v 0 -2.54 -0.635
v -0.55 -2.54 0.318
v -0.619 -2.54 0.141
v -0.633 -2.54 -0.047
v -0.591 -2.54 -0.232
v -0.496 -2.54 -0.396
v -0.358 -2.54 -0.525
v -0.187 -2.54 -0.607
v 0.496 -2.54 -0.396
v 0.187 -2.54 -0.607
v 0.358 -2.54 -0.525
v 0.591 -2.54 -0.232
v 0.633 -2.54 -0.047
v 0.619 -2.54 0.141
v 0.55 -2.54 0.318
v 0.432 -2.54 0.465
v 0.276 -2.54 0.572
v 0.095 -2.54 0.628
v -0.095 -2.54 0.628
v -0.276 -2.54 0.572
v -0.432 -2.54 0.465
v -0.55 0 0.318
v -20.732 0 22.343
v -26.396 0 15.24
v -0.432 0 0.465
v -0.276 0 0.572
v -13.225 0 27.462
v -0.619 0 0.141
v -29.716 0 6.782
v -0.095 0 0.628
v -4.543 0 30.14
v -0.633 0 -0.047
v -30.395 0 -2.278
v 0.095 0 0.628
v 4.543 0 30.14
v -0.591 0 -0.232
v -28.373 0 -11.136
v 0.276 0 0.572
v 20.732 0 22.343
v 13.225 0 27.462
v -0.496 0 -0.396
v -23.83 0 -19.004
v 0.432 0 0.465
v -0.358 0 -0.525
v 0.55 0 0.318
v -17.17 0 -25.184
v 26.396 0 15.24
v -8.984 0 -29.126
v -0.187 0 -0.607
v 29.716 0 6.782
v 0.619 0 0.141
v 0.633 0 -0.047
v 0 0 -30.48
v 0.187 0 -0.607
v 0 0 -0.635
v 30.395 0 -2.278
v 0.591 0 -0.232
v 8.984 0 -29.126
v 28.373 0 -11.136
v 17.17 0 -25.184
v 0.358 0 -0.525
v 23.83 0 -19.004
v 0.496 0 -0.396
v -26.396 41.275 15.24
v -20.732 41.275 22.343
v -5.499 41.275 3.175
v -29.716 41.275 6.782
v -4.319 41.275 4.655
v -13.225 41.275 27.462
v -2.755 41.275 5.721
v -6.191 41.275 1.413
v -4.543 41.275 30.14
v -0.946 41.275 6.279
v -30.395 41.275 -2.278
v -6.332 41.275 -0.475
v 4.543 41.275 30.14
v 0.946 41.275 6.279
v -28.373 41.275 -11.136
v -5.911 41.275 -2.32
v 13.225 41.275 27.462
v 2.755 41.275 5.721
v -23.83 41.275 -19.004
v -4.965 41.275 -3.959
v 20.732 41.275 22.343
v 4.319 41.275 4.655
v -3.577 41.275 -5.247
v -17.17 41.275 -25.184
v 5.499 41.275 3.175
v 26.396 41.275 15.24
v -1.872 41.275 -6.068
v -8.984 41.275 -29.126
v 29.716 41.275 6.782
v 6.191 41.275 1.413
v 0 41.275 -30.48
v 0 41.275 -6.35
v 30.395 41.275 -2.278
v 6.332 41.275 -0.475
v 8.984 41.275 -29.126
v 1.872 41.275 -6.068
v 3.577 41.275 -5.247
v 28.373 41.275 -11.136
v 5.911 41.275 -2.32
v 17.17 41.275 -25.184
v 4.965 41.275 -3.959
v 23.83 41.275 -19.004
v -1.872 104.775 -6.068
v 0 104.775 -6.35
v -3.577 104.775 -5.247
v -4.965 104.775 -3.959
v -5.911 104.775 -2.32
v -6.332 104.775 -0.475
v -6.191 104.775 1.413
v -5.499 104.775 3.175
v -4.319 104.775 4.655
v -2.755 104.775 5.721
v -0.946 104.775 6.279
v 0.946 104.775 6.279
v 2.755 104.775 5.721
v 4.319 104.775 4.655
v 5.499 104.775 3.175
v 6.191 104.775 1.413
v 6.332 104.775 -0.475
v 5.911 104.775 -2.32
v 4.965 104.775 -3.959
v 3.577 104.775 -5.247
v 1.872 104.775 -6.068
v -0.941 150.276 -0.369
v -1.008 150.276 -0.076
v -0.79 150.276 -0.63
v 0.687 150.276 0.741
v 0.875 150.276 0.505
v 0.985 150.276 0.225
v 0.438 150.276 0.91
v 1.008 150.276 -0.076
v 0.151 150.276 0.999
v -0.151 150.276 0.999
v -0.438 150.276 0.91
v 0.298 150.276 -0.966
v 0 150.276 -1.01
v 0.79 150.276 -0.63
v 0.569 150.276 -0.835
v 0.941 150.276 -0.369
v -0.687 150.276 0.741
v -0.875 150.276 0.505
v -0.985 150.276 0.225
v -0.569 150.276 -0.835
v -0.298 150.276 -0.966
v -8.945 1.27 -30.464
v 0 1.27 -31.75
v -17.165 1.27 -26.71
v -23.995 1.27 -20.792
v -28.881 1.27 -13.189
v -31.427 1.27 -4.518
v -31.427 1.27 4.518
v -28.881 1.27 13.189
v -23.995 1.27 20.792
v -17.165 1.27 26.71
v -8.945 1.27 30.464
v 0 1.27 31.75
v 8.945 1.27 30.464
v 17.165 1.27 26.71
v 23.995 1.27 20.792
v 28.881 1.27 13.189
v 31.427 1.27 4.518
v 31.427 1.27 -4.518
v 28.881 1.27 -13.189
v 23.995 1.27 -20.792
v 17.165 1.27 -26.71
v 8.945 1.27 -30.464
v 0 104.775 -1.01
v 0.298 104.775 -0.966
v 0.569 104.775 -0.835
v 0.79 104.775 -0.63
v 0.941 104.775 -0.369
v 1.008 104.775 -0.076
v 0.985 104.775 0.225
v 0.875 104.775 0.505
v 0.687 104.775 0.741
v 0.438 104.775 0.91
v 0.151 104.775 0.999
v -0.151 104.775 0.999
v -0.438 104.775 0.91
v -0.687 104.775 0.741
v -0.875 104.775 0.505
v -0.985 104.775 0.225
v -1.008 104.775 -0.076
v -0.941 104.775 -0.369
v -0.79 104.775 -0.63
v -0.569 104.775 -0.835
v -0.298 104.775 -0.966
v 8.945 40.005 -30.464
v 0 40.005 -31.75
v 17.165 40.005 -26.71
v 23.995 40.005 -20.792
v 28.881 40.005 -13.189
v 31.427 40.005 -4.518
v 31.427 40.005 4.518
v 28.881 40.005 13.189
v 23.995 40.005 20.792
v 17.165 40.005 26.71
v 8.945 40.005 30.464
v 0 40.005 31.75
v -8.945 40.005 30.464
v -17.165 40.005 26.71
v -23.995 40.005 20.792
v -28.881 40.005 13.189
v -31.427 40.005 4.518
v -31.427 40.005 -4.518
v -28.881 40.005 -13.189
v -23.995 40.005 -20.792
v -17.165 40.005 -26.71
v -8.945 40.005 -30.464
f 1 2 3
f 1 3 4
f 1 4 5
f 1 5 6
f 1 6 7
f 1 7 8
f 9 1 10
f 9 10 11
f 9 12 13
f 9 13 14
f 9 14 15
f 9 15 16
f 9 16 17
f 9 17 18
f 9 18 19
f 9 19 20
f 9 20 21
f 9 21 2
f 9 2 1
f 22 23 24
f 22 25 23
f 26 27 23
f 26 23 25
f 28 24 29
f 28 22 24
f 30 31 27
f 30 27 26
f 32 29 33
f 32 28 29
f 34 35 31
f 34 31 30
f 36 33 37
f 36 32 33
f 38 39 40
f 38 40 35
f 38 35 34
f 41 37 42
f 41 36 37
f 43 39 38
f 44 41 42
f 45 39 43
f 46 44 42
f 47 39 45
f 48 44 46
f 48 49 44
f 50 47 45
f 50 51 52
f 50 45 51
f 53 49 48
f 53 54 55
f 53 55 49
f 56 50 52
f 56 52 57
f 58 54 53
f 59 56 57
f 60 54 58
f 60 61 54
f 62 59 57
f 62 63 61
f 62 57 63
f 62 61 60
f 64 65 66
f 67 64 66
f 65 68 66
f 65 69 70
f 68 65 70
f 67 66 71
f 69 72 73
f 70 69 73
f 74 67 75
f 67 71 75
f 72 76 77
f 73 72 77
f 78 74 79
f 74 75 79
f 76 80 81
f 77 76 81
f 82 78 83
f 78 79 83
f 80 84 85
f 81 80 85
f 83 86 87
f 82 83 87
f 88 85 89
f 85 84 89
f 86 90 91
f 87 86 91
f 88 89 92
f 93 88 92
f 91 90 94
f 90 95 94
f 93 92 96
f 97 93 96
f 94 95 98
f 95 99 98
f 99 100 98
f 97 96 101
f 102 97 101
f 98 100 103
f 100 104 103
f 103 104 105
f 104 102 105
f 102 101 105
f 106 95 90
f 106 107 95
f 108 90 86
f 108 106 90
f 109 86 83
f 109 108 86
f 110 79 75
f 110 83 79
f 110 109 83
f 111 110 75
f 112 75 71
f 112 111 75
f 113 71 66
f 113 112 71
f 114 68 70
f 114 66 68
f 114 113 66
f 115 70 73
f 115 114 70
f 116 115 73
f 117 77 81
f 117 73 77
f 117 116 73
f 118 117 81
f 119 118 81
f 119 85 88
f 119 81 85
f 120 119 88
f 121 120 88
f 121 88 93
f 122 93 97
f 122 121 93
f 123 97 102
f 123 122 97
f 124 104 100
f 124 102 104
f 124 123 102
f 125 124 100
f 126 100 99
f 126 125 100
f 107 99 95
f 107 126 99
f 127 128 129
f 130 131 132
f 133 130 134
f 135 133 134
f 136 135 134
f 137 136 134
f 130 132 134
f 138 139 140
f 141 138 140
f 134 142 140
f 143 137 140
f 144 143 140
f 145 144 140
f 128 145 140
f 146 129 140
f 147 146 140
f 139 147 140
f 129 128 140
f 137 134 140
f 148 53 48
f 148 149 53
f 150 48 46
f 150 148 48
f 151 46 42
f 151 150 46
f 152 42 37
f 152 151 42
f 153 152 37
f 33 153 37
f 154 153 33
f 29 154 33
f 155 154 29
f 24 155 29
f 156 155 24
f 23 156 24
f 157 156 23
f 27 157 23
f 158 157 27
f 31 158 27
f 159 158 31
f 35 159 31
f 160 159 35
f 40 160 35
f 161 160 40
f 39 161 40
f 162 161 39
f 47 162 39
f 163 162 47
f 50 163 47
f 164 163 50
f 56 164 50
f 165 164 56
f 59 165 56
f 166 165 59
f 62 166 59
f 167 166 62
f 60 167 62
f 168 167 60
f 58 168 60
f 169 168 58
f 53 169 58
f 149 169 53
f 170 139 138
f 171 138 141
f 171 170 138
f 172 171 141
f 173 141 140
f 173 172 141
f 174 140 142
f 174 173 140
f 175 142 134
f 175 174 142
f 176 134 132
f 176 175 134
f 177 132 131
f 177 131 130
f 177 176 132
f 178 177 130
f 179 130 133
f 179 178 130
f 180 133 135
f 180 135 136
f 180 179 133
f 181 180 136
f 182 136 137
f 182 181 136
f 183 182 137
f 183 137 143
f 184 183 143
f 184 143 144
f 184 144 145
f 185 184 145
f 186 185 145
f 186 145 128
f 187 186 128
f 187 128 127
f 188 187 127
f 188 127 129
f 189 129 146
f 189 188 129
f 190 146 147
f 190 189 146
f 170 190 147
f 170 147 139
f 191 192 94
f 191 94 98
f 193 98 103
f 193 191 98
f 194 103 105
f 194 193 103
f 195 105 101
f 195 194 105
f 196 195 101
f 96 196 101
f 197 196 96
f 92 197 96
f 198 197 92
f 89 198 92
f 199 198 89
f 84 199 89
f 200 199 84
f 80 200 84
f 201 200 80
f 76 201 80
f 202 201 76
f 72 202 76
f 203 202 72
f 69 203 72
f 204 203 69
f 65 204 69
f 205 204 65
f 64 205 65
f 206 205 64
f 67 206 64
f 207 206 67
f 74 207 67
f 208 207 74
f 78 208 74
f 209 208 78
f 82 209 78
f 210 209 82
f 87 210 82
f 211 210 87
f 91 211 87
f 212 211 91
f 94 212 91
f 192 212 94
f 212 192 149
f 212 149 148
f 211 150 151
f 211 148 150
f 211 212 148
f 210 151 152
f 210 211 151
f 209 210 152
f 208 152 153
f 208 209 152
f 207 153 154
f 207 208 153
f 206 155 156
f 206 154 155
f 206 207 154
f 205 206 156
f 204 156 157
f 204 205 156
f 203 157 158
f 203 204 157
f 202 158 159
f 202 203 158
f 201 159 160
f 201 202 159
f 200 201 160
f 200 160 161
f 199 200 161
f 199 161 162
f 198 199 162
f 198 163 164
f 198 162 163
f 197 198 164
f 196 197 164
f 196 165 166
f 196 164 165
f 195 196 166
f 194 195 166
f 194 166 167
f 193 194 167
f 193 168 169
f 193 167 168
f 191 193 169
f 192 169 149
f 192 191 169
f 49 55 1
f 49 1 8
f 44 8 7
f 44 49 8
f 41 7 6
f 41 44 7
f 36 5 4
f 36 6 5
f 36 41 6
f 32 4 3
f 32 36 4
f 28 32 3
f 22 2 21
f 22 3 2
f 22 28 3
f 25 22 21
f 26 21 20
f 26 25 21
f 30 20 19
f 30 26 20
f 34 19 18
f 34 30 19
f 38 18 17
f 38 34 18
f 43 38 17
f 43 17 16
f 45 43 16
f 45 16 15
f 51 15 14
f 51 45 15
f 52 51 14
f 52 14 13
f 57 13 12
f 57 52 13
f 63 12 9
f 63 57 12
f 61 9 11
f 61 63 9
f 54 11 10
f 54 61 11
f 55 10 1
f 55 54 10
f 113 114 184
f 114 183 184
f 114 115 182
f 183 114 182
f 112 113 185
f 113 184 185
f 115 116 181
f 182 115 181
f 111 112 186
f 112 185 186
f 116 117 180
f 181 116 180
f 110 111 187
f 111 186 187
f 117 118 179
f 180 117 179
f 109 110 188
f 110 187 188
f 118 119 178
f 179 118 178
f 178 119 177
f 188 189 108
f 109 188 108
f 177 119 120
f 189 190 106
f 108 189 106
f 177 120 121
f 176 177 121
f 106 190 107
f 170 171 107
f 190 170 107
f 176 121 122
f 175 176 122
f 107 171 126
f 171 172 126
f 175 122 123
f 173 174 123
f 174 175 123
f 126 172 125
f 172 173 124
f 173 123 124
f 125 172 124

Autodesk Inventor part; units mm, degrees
ref_plane "YZ Plane" through (0, 0, 0) normal (1, 0, 0) x (0, 1, 0)
ref_plane "XZ Plane" through (0, 0, 0) normal (0, 1, 0) x (-1, 0, 0)
ref_plane "XY Plane" through (0, 0, 0) normal (0, 0, 1) x (1, 0, 0)
sketch "Sketch2" plane through (0, 0, 0) normal (1, 0, 0) x (0, 1, 0)
  line L0 (0, -0.635) -> (0, -31.75)
  line L1 (0, -31.75) -> (41.275, -31.75)
  line L2 (41.275, -31.75) -> (41.275, -6.35)
  line L3 (41.275, -6.35) -> (104.775, -6.35)
  line L4 (104.775, -6.35) -> (104.775, -1.0105)
  line L5 (104.775, 0) -> (0, 0)
  line L6 (-2.54, 0) -> (-2.54, -0.635)
  line L7 (-2.54, -0.635) -> (0, -0.635)
  line L8 (-2.54, 0) -> (0, 0)
  line L9 (104.775, 0) -> (150.2763, 0)
  line L10 (150.2763, 0) -> (150.2763, -1.0105)
  line L11 (150.2763, -1.0105) -> (104.775, -1.0105)
  dimension "d0" = 41.275
  dimension "d1" = 63.5
  dimension "d2" = 31.75
  dimension "d3" = 6.35
  dimension "d8" = 2.54
  dimension "d9" = 0.635
revolve "Revolution1" add sketch "Sketch2" angle 360 about axis through (0, 104.775, 0) along (0, -1, 0)
chamfer "Chamfer1" distance 1.27 angle 45 2 edges at (0, 41.275, 31.75) (0, 0, 31.75)
properties part number "Fixture_Weight"
